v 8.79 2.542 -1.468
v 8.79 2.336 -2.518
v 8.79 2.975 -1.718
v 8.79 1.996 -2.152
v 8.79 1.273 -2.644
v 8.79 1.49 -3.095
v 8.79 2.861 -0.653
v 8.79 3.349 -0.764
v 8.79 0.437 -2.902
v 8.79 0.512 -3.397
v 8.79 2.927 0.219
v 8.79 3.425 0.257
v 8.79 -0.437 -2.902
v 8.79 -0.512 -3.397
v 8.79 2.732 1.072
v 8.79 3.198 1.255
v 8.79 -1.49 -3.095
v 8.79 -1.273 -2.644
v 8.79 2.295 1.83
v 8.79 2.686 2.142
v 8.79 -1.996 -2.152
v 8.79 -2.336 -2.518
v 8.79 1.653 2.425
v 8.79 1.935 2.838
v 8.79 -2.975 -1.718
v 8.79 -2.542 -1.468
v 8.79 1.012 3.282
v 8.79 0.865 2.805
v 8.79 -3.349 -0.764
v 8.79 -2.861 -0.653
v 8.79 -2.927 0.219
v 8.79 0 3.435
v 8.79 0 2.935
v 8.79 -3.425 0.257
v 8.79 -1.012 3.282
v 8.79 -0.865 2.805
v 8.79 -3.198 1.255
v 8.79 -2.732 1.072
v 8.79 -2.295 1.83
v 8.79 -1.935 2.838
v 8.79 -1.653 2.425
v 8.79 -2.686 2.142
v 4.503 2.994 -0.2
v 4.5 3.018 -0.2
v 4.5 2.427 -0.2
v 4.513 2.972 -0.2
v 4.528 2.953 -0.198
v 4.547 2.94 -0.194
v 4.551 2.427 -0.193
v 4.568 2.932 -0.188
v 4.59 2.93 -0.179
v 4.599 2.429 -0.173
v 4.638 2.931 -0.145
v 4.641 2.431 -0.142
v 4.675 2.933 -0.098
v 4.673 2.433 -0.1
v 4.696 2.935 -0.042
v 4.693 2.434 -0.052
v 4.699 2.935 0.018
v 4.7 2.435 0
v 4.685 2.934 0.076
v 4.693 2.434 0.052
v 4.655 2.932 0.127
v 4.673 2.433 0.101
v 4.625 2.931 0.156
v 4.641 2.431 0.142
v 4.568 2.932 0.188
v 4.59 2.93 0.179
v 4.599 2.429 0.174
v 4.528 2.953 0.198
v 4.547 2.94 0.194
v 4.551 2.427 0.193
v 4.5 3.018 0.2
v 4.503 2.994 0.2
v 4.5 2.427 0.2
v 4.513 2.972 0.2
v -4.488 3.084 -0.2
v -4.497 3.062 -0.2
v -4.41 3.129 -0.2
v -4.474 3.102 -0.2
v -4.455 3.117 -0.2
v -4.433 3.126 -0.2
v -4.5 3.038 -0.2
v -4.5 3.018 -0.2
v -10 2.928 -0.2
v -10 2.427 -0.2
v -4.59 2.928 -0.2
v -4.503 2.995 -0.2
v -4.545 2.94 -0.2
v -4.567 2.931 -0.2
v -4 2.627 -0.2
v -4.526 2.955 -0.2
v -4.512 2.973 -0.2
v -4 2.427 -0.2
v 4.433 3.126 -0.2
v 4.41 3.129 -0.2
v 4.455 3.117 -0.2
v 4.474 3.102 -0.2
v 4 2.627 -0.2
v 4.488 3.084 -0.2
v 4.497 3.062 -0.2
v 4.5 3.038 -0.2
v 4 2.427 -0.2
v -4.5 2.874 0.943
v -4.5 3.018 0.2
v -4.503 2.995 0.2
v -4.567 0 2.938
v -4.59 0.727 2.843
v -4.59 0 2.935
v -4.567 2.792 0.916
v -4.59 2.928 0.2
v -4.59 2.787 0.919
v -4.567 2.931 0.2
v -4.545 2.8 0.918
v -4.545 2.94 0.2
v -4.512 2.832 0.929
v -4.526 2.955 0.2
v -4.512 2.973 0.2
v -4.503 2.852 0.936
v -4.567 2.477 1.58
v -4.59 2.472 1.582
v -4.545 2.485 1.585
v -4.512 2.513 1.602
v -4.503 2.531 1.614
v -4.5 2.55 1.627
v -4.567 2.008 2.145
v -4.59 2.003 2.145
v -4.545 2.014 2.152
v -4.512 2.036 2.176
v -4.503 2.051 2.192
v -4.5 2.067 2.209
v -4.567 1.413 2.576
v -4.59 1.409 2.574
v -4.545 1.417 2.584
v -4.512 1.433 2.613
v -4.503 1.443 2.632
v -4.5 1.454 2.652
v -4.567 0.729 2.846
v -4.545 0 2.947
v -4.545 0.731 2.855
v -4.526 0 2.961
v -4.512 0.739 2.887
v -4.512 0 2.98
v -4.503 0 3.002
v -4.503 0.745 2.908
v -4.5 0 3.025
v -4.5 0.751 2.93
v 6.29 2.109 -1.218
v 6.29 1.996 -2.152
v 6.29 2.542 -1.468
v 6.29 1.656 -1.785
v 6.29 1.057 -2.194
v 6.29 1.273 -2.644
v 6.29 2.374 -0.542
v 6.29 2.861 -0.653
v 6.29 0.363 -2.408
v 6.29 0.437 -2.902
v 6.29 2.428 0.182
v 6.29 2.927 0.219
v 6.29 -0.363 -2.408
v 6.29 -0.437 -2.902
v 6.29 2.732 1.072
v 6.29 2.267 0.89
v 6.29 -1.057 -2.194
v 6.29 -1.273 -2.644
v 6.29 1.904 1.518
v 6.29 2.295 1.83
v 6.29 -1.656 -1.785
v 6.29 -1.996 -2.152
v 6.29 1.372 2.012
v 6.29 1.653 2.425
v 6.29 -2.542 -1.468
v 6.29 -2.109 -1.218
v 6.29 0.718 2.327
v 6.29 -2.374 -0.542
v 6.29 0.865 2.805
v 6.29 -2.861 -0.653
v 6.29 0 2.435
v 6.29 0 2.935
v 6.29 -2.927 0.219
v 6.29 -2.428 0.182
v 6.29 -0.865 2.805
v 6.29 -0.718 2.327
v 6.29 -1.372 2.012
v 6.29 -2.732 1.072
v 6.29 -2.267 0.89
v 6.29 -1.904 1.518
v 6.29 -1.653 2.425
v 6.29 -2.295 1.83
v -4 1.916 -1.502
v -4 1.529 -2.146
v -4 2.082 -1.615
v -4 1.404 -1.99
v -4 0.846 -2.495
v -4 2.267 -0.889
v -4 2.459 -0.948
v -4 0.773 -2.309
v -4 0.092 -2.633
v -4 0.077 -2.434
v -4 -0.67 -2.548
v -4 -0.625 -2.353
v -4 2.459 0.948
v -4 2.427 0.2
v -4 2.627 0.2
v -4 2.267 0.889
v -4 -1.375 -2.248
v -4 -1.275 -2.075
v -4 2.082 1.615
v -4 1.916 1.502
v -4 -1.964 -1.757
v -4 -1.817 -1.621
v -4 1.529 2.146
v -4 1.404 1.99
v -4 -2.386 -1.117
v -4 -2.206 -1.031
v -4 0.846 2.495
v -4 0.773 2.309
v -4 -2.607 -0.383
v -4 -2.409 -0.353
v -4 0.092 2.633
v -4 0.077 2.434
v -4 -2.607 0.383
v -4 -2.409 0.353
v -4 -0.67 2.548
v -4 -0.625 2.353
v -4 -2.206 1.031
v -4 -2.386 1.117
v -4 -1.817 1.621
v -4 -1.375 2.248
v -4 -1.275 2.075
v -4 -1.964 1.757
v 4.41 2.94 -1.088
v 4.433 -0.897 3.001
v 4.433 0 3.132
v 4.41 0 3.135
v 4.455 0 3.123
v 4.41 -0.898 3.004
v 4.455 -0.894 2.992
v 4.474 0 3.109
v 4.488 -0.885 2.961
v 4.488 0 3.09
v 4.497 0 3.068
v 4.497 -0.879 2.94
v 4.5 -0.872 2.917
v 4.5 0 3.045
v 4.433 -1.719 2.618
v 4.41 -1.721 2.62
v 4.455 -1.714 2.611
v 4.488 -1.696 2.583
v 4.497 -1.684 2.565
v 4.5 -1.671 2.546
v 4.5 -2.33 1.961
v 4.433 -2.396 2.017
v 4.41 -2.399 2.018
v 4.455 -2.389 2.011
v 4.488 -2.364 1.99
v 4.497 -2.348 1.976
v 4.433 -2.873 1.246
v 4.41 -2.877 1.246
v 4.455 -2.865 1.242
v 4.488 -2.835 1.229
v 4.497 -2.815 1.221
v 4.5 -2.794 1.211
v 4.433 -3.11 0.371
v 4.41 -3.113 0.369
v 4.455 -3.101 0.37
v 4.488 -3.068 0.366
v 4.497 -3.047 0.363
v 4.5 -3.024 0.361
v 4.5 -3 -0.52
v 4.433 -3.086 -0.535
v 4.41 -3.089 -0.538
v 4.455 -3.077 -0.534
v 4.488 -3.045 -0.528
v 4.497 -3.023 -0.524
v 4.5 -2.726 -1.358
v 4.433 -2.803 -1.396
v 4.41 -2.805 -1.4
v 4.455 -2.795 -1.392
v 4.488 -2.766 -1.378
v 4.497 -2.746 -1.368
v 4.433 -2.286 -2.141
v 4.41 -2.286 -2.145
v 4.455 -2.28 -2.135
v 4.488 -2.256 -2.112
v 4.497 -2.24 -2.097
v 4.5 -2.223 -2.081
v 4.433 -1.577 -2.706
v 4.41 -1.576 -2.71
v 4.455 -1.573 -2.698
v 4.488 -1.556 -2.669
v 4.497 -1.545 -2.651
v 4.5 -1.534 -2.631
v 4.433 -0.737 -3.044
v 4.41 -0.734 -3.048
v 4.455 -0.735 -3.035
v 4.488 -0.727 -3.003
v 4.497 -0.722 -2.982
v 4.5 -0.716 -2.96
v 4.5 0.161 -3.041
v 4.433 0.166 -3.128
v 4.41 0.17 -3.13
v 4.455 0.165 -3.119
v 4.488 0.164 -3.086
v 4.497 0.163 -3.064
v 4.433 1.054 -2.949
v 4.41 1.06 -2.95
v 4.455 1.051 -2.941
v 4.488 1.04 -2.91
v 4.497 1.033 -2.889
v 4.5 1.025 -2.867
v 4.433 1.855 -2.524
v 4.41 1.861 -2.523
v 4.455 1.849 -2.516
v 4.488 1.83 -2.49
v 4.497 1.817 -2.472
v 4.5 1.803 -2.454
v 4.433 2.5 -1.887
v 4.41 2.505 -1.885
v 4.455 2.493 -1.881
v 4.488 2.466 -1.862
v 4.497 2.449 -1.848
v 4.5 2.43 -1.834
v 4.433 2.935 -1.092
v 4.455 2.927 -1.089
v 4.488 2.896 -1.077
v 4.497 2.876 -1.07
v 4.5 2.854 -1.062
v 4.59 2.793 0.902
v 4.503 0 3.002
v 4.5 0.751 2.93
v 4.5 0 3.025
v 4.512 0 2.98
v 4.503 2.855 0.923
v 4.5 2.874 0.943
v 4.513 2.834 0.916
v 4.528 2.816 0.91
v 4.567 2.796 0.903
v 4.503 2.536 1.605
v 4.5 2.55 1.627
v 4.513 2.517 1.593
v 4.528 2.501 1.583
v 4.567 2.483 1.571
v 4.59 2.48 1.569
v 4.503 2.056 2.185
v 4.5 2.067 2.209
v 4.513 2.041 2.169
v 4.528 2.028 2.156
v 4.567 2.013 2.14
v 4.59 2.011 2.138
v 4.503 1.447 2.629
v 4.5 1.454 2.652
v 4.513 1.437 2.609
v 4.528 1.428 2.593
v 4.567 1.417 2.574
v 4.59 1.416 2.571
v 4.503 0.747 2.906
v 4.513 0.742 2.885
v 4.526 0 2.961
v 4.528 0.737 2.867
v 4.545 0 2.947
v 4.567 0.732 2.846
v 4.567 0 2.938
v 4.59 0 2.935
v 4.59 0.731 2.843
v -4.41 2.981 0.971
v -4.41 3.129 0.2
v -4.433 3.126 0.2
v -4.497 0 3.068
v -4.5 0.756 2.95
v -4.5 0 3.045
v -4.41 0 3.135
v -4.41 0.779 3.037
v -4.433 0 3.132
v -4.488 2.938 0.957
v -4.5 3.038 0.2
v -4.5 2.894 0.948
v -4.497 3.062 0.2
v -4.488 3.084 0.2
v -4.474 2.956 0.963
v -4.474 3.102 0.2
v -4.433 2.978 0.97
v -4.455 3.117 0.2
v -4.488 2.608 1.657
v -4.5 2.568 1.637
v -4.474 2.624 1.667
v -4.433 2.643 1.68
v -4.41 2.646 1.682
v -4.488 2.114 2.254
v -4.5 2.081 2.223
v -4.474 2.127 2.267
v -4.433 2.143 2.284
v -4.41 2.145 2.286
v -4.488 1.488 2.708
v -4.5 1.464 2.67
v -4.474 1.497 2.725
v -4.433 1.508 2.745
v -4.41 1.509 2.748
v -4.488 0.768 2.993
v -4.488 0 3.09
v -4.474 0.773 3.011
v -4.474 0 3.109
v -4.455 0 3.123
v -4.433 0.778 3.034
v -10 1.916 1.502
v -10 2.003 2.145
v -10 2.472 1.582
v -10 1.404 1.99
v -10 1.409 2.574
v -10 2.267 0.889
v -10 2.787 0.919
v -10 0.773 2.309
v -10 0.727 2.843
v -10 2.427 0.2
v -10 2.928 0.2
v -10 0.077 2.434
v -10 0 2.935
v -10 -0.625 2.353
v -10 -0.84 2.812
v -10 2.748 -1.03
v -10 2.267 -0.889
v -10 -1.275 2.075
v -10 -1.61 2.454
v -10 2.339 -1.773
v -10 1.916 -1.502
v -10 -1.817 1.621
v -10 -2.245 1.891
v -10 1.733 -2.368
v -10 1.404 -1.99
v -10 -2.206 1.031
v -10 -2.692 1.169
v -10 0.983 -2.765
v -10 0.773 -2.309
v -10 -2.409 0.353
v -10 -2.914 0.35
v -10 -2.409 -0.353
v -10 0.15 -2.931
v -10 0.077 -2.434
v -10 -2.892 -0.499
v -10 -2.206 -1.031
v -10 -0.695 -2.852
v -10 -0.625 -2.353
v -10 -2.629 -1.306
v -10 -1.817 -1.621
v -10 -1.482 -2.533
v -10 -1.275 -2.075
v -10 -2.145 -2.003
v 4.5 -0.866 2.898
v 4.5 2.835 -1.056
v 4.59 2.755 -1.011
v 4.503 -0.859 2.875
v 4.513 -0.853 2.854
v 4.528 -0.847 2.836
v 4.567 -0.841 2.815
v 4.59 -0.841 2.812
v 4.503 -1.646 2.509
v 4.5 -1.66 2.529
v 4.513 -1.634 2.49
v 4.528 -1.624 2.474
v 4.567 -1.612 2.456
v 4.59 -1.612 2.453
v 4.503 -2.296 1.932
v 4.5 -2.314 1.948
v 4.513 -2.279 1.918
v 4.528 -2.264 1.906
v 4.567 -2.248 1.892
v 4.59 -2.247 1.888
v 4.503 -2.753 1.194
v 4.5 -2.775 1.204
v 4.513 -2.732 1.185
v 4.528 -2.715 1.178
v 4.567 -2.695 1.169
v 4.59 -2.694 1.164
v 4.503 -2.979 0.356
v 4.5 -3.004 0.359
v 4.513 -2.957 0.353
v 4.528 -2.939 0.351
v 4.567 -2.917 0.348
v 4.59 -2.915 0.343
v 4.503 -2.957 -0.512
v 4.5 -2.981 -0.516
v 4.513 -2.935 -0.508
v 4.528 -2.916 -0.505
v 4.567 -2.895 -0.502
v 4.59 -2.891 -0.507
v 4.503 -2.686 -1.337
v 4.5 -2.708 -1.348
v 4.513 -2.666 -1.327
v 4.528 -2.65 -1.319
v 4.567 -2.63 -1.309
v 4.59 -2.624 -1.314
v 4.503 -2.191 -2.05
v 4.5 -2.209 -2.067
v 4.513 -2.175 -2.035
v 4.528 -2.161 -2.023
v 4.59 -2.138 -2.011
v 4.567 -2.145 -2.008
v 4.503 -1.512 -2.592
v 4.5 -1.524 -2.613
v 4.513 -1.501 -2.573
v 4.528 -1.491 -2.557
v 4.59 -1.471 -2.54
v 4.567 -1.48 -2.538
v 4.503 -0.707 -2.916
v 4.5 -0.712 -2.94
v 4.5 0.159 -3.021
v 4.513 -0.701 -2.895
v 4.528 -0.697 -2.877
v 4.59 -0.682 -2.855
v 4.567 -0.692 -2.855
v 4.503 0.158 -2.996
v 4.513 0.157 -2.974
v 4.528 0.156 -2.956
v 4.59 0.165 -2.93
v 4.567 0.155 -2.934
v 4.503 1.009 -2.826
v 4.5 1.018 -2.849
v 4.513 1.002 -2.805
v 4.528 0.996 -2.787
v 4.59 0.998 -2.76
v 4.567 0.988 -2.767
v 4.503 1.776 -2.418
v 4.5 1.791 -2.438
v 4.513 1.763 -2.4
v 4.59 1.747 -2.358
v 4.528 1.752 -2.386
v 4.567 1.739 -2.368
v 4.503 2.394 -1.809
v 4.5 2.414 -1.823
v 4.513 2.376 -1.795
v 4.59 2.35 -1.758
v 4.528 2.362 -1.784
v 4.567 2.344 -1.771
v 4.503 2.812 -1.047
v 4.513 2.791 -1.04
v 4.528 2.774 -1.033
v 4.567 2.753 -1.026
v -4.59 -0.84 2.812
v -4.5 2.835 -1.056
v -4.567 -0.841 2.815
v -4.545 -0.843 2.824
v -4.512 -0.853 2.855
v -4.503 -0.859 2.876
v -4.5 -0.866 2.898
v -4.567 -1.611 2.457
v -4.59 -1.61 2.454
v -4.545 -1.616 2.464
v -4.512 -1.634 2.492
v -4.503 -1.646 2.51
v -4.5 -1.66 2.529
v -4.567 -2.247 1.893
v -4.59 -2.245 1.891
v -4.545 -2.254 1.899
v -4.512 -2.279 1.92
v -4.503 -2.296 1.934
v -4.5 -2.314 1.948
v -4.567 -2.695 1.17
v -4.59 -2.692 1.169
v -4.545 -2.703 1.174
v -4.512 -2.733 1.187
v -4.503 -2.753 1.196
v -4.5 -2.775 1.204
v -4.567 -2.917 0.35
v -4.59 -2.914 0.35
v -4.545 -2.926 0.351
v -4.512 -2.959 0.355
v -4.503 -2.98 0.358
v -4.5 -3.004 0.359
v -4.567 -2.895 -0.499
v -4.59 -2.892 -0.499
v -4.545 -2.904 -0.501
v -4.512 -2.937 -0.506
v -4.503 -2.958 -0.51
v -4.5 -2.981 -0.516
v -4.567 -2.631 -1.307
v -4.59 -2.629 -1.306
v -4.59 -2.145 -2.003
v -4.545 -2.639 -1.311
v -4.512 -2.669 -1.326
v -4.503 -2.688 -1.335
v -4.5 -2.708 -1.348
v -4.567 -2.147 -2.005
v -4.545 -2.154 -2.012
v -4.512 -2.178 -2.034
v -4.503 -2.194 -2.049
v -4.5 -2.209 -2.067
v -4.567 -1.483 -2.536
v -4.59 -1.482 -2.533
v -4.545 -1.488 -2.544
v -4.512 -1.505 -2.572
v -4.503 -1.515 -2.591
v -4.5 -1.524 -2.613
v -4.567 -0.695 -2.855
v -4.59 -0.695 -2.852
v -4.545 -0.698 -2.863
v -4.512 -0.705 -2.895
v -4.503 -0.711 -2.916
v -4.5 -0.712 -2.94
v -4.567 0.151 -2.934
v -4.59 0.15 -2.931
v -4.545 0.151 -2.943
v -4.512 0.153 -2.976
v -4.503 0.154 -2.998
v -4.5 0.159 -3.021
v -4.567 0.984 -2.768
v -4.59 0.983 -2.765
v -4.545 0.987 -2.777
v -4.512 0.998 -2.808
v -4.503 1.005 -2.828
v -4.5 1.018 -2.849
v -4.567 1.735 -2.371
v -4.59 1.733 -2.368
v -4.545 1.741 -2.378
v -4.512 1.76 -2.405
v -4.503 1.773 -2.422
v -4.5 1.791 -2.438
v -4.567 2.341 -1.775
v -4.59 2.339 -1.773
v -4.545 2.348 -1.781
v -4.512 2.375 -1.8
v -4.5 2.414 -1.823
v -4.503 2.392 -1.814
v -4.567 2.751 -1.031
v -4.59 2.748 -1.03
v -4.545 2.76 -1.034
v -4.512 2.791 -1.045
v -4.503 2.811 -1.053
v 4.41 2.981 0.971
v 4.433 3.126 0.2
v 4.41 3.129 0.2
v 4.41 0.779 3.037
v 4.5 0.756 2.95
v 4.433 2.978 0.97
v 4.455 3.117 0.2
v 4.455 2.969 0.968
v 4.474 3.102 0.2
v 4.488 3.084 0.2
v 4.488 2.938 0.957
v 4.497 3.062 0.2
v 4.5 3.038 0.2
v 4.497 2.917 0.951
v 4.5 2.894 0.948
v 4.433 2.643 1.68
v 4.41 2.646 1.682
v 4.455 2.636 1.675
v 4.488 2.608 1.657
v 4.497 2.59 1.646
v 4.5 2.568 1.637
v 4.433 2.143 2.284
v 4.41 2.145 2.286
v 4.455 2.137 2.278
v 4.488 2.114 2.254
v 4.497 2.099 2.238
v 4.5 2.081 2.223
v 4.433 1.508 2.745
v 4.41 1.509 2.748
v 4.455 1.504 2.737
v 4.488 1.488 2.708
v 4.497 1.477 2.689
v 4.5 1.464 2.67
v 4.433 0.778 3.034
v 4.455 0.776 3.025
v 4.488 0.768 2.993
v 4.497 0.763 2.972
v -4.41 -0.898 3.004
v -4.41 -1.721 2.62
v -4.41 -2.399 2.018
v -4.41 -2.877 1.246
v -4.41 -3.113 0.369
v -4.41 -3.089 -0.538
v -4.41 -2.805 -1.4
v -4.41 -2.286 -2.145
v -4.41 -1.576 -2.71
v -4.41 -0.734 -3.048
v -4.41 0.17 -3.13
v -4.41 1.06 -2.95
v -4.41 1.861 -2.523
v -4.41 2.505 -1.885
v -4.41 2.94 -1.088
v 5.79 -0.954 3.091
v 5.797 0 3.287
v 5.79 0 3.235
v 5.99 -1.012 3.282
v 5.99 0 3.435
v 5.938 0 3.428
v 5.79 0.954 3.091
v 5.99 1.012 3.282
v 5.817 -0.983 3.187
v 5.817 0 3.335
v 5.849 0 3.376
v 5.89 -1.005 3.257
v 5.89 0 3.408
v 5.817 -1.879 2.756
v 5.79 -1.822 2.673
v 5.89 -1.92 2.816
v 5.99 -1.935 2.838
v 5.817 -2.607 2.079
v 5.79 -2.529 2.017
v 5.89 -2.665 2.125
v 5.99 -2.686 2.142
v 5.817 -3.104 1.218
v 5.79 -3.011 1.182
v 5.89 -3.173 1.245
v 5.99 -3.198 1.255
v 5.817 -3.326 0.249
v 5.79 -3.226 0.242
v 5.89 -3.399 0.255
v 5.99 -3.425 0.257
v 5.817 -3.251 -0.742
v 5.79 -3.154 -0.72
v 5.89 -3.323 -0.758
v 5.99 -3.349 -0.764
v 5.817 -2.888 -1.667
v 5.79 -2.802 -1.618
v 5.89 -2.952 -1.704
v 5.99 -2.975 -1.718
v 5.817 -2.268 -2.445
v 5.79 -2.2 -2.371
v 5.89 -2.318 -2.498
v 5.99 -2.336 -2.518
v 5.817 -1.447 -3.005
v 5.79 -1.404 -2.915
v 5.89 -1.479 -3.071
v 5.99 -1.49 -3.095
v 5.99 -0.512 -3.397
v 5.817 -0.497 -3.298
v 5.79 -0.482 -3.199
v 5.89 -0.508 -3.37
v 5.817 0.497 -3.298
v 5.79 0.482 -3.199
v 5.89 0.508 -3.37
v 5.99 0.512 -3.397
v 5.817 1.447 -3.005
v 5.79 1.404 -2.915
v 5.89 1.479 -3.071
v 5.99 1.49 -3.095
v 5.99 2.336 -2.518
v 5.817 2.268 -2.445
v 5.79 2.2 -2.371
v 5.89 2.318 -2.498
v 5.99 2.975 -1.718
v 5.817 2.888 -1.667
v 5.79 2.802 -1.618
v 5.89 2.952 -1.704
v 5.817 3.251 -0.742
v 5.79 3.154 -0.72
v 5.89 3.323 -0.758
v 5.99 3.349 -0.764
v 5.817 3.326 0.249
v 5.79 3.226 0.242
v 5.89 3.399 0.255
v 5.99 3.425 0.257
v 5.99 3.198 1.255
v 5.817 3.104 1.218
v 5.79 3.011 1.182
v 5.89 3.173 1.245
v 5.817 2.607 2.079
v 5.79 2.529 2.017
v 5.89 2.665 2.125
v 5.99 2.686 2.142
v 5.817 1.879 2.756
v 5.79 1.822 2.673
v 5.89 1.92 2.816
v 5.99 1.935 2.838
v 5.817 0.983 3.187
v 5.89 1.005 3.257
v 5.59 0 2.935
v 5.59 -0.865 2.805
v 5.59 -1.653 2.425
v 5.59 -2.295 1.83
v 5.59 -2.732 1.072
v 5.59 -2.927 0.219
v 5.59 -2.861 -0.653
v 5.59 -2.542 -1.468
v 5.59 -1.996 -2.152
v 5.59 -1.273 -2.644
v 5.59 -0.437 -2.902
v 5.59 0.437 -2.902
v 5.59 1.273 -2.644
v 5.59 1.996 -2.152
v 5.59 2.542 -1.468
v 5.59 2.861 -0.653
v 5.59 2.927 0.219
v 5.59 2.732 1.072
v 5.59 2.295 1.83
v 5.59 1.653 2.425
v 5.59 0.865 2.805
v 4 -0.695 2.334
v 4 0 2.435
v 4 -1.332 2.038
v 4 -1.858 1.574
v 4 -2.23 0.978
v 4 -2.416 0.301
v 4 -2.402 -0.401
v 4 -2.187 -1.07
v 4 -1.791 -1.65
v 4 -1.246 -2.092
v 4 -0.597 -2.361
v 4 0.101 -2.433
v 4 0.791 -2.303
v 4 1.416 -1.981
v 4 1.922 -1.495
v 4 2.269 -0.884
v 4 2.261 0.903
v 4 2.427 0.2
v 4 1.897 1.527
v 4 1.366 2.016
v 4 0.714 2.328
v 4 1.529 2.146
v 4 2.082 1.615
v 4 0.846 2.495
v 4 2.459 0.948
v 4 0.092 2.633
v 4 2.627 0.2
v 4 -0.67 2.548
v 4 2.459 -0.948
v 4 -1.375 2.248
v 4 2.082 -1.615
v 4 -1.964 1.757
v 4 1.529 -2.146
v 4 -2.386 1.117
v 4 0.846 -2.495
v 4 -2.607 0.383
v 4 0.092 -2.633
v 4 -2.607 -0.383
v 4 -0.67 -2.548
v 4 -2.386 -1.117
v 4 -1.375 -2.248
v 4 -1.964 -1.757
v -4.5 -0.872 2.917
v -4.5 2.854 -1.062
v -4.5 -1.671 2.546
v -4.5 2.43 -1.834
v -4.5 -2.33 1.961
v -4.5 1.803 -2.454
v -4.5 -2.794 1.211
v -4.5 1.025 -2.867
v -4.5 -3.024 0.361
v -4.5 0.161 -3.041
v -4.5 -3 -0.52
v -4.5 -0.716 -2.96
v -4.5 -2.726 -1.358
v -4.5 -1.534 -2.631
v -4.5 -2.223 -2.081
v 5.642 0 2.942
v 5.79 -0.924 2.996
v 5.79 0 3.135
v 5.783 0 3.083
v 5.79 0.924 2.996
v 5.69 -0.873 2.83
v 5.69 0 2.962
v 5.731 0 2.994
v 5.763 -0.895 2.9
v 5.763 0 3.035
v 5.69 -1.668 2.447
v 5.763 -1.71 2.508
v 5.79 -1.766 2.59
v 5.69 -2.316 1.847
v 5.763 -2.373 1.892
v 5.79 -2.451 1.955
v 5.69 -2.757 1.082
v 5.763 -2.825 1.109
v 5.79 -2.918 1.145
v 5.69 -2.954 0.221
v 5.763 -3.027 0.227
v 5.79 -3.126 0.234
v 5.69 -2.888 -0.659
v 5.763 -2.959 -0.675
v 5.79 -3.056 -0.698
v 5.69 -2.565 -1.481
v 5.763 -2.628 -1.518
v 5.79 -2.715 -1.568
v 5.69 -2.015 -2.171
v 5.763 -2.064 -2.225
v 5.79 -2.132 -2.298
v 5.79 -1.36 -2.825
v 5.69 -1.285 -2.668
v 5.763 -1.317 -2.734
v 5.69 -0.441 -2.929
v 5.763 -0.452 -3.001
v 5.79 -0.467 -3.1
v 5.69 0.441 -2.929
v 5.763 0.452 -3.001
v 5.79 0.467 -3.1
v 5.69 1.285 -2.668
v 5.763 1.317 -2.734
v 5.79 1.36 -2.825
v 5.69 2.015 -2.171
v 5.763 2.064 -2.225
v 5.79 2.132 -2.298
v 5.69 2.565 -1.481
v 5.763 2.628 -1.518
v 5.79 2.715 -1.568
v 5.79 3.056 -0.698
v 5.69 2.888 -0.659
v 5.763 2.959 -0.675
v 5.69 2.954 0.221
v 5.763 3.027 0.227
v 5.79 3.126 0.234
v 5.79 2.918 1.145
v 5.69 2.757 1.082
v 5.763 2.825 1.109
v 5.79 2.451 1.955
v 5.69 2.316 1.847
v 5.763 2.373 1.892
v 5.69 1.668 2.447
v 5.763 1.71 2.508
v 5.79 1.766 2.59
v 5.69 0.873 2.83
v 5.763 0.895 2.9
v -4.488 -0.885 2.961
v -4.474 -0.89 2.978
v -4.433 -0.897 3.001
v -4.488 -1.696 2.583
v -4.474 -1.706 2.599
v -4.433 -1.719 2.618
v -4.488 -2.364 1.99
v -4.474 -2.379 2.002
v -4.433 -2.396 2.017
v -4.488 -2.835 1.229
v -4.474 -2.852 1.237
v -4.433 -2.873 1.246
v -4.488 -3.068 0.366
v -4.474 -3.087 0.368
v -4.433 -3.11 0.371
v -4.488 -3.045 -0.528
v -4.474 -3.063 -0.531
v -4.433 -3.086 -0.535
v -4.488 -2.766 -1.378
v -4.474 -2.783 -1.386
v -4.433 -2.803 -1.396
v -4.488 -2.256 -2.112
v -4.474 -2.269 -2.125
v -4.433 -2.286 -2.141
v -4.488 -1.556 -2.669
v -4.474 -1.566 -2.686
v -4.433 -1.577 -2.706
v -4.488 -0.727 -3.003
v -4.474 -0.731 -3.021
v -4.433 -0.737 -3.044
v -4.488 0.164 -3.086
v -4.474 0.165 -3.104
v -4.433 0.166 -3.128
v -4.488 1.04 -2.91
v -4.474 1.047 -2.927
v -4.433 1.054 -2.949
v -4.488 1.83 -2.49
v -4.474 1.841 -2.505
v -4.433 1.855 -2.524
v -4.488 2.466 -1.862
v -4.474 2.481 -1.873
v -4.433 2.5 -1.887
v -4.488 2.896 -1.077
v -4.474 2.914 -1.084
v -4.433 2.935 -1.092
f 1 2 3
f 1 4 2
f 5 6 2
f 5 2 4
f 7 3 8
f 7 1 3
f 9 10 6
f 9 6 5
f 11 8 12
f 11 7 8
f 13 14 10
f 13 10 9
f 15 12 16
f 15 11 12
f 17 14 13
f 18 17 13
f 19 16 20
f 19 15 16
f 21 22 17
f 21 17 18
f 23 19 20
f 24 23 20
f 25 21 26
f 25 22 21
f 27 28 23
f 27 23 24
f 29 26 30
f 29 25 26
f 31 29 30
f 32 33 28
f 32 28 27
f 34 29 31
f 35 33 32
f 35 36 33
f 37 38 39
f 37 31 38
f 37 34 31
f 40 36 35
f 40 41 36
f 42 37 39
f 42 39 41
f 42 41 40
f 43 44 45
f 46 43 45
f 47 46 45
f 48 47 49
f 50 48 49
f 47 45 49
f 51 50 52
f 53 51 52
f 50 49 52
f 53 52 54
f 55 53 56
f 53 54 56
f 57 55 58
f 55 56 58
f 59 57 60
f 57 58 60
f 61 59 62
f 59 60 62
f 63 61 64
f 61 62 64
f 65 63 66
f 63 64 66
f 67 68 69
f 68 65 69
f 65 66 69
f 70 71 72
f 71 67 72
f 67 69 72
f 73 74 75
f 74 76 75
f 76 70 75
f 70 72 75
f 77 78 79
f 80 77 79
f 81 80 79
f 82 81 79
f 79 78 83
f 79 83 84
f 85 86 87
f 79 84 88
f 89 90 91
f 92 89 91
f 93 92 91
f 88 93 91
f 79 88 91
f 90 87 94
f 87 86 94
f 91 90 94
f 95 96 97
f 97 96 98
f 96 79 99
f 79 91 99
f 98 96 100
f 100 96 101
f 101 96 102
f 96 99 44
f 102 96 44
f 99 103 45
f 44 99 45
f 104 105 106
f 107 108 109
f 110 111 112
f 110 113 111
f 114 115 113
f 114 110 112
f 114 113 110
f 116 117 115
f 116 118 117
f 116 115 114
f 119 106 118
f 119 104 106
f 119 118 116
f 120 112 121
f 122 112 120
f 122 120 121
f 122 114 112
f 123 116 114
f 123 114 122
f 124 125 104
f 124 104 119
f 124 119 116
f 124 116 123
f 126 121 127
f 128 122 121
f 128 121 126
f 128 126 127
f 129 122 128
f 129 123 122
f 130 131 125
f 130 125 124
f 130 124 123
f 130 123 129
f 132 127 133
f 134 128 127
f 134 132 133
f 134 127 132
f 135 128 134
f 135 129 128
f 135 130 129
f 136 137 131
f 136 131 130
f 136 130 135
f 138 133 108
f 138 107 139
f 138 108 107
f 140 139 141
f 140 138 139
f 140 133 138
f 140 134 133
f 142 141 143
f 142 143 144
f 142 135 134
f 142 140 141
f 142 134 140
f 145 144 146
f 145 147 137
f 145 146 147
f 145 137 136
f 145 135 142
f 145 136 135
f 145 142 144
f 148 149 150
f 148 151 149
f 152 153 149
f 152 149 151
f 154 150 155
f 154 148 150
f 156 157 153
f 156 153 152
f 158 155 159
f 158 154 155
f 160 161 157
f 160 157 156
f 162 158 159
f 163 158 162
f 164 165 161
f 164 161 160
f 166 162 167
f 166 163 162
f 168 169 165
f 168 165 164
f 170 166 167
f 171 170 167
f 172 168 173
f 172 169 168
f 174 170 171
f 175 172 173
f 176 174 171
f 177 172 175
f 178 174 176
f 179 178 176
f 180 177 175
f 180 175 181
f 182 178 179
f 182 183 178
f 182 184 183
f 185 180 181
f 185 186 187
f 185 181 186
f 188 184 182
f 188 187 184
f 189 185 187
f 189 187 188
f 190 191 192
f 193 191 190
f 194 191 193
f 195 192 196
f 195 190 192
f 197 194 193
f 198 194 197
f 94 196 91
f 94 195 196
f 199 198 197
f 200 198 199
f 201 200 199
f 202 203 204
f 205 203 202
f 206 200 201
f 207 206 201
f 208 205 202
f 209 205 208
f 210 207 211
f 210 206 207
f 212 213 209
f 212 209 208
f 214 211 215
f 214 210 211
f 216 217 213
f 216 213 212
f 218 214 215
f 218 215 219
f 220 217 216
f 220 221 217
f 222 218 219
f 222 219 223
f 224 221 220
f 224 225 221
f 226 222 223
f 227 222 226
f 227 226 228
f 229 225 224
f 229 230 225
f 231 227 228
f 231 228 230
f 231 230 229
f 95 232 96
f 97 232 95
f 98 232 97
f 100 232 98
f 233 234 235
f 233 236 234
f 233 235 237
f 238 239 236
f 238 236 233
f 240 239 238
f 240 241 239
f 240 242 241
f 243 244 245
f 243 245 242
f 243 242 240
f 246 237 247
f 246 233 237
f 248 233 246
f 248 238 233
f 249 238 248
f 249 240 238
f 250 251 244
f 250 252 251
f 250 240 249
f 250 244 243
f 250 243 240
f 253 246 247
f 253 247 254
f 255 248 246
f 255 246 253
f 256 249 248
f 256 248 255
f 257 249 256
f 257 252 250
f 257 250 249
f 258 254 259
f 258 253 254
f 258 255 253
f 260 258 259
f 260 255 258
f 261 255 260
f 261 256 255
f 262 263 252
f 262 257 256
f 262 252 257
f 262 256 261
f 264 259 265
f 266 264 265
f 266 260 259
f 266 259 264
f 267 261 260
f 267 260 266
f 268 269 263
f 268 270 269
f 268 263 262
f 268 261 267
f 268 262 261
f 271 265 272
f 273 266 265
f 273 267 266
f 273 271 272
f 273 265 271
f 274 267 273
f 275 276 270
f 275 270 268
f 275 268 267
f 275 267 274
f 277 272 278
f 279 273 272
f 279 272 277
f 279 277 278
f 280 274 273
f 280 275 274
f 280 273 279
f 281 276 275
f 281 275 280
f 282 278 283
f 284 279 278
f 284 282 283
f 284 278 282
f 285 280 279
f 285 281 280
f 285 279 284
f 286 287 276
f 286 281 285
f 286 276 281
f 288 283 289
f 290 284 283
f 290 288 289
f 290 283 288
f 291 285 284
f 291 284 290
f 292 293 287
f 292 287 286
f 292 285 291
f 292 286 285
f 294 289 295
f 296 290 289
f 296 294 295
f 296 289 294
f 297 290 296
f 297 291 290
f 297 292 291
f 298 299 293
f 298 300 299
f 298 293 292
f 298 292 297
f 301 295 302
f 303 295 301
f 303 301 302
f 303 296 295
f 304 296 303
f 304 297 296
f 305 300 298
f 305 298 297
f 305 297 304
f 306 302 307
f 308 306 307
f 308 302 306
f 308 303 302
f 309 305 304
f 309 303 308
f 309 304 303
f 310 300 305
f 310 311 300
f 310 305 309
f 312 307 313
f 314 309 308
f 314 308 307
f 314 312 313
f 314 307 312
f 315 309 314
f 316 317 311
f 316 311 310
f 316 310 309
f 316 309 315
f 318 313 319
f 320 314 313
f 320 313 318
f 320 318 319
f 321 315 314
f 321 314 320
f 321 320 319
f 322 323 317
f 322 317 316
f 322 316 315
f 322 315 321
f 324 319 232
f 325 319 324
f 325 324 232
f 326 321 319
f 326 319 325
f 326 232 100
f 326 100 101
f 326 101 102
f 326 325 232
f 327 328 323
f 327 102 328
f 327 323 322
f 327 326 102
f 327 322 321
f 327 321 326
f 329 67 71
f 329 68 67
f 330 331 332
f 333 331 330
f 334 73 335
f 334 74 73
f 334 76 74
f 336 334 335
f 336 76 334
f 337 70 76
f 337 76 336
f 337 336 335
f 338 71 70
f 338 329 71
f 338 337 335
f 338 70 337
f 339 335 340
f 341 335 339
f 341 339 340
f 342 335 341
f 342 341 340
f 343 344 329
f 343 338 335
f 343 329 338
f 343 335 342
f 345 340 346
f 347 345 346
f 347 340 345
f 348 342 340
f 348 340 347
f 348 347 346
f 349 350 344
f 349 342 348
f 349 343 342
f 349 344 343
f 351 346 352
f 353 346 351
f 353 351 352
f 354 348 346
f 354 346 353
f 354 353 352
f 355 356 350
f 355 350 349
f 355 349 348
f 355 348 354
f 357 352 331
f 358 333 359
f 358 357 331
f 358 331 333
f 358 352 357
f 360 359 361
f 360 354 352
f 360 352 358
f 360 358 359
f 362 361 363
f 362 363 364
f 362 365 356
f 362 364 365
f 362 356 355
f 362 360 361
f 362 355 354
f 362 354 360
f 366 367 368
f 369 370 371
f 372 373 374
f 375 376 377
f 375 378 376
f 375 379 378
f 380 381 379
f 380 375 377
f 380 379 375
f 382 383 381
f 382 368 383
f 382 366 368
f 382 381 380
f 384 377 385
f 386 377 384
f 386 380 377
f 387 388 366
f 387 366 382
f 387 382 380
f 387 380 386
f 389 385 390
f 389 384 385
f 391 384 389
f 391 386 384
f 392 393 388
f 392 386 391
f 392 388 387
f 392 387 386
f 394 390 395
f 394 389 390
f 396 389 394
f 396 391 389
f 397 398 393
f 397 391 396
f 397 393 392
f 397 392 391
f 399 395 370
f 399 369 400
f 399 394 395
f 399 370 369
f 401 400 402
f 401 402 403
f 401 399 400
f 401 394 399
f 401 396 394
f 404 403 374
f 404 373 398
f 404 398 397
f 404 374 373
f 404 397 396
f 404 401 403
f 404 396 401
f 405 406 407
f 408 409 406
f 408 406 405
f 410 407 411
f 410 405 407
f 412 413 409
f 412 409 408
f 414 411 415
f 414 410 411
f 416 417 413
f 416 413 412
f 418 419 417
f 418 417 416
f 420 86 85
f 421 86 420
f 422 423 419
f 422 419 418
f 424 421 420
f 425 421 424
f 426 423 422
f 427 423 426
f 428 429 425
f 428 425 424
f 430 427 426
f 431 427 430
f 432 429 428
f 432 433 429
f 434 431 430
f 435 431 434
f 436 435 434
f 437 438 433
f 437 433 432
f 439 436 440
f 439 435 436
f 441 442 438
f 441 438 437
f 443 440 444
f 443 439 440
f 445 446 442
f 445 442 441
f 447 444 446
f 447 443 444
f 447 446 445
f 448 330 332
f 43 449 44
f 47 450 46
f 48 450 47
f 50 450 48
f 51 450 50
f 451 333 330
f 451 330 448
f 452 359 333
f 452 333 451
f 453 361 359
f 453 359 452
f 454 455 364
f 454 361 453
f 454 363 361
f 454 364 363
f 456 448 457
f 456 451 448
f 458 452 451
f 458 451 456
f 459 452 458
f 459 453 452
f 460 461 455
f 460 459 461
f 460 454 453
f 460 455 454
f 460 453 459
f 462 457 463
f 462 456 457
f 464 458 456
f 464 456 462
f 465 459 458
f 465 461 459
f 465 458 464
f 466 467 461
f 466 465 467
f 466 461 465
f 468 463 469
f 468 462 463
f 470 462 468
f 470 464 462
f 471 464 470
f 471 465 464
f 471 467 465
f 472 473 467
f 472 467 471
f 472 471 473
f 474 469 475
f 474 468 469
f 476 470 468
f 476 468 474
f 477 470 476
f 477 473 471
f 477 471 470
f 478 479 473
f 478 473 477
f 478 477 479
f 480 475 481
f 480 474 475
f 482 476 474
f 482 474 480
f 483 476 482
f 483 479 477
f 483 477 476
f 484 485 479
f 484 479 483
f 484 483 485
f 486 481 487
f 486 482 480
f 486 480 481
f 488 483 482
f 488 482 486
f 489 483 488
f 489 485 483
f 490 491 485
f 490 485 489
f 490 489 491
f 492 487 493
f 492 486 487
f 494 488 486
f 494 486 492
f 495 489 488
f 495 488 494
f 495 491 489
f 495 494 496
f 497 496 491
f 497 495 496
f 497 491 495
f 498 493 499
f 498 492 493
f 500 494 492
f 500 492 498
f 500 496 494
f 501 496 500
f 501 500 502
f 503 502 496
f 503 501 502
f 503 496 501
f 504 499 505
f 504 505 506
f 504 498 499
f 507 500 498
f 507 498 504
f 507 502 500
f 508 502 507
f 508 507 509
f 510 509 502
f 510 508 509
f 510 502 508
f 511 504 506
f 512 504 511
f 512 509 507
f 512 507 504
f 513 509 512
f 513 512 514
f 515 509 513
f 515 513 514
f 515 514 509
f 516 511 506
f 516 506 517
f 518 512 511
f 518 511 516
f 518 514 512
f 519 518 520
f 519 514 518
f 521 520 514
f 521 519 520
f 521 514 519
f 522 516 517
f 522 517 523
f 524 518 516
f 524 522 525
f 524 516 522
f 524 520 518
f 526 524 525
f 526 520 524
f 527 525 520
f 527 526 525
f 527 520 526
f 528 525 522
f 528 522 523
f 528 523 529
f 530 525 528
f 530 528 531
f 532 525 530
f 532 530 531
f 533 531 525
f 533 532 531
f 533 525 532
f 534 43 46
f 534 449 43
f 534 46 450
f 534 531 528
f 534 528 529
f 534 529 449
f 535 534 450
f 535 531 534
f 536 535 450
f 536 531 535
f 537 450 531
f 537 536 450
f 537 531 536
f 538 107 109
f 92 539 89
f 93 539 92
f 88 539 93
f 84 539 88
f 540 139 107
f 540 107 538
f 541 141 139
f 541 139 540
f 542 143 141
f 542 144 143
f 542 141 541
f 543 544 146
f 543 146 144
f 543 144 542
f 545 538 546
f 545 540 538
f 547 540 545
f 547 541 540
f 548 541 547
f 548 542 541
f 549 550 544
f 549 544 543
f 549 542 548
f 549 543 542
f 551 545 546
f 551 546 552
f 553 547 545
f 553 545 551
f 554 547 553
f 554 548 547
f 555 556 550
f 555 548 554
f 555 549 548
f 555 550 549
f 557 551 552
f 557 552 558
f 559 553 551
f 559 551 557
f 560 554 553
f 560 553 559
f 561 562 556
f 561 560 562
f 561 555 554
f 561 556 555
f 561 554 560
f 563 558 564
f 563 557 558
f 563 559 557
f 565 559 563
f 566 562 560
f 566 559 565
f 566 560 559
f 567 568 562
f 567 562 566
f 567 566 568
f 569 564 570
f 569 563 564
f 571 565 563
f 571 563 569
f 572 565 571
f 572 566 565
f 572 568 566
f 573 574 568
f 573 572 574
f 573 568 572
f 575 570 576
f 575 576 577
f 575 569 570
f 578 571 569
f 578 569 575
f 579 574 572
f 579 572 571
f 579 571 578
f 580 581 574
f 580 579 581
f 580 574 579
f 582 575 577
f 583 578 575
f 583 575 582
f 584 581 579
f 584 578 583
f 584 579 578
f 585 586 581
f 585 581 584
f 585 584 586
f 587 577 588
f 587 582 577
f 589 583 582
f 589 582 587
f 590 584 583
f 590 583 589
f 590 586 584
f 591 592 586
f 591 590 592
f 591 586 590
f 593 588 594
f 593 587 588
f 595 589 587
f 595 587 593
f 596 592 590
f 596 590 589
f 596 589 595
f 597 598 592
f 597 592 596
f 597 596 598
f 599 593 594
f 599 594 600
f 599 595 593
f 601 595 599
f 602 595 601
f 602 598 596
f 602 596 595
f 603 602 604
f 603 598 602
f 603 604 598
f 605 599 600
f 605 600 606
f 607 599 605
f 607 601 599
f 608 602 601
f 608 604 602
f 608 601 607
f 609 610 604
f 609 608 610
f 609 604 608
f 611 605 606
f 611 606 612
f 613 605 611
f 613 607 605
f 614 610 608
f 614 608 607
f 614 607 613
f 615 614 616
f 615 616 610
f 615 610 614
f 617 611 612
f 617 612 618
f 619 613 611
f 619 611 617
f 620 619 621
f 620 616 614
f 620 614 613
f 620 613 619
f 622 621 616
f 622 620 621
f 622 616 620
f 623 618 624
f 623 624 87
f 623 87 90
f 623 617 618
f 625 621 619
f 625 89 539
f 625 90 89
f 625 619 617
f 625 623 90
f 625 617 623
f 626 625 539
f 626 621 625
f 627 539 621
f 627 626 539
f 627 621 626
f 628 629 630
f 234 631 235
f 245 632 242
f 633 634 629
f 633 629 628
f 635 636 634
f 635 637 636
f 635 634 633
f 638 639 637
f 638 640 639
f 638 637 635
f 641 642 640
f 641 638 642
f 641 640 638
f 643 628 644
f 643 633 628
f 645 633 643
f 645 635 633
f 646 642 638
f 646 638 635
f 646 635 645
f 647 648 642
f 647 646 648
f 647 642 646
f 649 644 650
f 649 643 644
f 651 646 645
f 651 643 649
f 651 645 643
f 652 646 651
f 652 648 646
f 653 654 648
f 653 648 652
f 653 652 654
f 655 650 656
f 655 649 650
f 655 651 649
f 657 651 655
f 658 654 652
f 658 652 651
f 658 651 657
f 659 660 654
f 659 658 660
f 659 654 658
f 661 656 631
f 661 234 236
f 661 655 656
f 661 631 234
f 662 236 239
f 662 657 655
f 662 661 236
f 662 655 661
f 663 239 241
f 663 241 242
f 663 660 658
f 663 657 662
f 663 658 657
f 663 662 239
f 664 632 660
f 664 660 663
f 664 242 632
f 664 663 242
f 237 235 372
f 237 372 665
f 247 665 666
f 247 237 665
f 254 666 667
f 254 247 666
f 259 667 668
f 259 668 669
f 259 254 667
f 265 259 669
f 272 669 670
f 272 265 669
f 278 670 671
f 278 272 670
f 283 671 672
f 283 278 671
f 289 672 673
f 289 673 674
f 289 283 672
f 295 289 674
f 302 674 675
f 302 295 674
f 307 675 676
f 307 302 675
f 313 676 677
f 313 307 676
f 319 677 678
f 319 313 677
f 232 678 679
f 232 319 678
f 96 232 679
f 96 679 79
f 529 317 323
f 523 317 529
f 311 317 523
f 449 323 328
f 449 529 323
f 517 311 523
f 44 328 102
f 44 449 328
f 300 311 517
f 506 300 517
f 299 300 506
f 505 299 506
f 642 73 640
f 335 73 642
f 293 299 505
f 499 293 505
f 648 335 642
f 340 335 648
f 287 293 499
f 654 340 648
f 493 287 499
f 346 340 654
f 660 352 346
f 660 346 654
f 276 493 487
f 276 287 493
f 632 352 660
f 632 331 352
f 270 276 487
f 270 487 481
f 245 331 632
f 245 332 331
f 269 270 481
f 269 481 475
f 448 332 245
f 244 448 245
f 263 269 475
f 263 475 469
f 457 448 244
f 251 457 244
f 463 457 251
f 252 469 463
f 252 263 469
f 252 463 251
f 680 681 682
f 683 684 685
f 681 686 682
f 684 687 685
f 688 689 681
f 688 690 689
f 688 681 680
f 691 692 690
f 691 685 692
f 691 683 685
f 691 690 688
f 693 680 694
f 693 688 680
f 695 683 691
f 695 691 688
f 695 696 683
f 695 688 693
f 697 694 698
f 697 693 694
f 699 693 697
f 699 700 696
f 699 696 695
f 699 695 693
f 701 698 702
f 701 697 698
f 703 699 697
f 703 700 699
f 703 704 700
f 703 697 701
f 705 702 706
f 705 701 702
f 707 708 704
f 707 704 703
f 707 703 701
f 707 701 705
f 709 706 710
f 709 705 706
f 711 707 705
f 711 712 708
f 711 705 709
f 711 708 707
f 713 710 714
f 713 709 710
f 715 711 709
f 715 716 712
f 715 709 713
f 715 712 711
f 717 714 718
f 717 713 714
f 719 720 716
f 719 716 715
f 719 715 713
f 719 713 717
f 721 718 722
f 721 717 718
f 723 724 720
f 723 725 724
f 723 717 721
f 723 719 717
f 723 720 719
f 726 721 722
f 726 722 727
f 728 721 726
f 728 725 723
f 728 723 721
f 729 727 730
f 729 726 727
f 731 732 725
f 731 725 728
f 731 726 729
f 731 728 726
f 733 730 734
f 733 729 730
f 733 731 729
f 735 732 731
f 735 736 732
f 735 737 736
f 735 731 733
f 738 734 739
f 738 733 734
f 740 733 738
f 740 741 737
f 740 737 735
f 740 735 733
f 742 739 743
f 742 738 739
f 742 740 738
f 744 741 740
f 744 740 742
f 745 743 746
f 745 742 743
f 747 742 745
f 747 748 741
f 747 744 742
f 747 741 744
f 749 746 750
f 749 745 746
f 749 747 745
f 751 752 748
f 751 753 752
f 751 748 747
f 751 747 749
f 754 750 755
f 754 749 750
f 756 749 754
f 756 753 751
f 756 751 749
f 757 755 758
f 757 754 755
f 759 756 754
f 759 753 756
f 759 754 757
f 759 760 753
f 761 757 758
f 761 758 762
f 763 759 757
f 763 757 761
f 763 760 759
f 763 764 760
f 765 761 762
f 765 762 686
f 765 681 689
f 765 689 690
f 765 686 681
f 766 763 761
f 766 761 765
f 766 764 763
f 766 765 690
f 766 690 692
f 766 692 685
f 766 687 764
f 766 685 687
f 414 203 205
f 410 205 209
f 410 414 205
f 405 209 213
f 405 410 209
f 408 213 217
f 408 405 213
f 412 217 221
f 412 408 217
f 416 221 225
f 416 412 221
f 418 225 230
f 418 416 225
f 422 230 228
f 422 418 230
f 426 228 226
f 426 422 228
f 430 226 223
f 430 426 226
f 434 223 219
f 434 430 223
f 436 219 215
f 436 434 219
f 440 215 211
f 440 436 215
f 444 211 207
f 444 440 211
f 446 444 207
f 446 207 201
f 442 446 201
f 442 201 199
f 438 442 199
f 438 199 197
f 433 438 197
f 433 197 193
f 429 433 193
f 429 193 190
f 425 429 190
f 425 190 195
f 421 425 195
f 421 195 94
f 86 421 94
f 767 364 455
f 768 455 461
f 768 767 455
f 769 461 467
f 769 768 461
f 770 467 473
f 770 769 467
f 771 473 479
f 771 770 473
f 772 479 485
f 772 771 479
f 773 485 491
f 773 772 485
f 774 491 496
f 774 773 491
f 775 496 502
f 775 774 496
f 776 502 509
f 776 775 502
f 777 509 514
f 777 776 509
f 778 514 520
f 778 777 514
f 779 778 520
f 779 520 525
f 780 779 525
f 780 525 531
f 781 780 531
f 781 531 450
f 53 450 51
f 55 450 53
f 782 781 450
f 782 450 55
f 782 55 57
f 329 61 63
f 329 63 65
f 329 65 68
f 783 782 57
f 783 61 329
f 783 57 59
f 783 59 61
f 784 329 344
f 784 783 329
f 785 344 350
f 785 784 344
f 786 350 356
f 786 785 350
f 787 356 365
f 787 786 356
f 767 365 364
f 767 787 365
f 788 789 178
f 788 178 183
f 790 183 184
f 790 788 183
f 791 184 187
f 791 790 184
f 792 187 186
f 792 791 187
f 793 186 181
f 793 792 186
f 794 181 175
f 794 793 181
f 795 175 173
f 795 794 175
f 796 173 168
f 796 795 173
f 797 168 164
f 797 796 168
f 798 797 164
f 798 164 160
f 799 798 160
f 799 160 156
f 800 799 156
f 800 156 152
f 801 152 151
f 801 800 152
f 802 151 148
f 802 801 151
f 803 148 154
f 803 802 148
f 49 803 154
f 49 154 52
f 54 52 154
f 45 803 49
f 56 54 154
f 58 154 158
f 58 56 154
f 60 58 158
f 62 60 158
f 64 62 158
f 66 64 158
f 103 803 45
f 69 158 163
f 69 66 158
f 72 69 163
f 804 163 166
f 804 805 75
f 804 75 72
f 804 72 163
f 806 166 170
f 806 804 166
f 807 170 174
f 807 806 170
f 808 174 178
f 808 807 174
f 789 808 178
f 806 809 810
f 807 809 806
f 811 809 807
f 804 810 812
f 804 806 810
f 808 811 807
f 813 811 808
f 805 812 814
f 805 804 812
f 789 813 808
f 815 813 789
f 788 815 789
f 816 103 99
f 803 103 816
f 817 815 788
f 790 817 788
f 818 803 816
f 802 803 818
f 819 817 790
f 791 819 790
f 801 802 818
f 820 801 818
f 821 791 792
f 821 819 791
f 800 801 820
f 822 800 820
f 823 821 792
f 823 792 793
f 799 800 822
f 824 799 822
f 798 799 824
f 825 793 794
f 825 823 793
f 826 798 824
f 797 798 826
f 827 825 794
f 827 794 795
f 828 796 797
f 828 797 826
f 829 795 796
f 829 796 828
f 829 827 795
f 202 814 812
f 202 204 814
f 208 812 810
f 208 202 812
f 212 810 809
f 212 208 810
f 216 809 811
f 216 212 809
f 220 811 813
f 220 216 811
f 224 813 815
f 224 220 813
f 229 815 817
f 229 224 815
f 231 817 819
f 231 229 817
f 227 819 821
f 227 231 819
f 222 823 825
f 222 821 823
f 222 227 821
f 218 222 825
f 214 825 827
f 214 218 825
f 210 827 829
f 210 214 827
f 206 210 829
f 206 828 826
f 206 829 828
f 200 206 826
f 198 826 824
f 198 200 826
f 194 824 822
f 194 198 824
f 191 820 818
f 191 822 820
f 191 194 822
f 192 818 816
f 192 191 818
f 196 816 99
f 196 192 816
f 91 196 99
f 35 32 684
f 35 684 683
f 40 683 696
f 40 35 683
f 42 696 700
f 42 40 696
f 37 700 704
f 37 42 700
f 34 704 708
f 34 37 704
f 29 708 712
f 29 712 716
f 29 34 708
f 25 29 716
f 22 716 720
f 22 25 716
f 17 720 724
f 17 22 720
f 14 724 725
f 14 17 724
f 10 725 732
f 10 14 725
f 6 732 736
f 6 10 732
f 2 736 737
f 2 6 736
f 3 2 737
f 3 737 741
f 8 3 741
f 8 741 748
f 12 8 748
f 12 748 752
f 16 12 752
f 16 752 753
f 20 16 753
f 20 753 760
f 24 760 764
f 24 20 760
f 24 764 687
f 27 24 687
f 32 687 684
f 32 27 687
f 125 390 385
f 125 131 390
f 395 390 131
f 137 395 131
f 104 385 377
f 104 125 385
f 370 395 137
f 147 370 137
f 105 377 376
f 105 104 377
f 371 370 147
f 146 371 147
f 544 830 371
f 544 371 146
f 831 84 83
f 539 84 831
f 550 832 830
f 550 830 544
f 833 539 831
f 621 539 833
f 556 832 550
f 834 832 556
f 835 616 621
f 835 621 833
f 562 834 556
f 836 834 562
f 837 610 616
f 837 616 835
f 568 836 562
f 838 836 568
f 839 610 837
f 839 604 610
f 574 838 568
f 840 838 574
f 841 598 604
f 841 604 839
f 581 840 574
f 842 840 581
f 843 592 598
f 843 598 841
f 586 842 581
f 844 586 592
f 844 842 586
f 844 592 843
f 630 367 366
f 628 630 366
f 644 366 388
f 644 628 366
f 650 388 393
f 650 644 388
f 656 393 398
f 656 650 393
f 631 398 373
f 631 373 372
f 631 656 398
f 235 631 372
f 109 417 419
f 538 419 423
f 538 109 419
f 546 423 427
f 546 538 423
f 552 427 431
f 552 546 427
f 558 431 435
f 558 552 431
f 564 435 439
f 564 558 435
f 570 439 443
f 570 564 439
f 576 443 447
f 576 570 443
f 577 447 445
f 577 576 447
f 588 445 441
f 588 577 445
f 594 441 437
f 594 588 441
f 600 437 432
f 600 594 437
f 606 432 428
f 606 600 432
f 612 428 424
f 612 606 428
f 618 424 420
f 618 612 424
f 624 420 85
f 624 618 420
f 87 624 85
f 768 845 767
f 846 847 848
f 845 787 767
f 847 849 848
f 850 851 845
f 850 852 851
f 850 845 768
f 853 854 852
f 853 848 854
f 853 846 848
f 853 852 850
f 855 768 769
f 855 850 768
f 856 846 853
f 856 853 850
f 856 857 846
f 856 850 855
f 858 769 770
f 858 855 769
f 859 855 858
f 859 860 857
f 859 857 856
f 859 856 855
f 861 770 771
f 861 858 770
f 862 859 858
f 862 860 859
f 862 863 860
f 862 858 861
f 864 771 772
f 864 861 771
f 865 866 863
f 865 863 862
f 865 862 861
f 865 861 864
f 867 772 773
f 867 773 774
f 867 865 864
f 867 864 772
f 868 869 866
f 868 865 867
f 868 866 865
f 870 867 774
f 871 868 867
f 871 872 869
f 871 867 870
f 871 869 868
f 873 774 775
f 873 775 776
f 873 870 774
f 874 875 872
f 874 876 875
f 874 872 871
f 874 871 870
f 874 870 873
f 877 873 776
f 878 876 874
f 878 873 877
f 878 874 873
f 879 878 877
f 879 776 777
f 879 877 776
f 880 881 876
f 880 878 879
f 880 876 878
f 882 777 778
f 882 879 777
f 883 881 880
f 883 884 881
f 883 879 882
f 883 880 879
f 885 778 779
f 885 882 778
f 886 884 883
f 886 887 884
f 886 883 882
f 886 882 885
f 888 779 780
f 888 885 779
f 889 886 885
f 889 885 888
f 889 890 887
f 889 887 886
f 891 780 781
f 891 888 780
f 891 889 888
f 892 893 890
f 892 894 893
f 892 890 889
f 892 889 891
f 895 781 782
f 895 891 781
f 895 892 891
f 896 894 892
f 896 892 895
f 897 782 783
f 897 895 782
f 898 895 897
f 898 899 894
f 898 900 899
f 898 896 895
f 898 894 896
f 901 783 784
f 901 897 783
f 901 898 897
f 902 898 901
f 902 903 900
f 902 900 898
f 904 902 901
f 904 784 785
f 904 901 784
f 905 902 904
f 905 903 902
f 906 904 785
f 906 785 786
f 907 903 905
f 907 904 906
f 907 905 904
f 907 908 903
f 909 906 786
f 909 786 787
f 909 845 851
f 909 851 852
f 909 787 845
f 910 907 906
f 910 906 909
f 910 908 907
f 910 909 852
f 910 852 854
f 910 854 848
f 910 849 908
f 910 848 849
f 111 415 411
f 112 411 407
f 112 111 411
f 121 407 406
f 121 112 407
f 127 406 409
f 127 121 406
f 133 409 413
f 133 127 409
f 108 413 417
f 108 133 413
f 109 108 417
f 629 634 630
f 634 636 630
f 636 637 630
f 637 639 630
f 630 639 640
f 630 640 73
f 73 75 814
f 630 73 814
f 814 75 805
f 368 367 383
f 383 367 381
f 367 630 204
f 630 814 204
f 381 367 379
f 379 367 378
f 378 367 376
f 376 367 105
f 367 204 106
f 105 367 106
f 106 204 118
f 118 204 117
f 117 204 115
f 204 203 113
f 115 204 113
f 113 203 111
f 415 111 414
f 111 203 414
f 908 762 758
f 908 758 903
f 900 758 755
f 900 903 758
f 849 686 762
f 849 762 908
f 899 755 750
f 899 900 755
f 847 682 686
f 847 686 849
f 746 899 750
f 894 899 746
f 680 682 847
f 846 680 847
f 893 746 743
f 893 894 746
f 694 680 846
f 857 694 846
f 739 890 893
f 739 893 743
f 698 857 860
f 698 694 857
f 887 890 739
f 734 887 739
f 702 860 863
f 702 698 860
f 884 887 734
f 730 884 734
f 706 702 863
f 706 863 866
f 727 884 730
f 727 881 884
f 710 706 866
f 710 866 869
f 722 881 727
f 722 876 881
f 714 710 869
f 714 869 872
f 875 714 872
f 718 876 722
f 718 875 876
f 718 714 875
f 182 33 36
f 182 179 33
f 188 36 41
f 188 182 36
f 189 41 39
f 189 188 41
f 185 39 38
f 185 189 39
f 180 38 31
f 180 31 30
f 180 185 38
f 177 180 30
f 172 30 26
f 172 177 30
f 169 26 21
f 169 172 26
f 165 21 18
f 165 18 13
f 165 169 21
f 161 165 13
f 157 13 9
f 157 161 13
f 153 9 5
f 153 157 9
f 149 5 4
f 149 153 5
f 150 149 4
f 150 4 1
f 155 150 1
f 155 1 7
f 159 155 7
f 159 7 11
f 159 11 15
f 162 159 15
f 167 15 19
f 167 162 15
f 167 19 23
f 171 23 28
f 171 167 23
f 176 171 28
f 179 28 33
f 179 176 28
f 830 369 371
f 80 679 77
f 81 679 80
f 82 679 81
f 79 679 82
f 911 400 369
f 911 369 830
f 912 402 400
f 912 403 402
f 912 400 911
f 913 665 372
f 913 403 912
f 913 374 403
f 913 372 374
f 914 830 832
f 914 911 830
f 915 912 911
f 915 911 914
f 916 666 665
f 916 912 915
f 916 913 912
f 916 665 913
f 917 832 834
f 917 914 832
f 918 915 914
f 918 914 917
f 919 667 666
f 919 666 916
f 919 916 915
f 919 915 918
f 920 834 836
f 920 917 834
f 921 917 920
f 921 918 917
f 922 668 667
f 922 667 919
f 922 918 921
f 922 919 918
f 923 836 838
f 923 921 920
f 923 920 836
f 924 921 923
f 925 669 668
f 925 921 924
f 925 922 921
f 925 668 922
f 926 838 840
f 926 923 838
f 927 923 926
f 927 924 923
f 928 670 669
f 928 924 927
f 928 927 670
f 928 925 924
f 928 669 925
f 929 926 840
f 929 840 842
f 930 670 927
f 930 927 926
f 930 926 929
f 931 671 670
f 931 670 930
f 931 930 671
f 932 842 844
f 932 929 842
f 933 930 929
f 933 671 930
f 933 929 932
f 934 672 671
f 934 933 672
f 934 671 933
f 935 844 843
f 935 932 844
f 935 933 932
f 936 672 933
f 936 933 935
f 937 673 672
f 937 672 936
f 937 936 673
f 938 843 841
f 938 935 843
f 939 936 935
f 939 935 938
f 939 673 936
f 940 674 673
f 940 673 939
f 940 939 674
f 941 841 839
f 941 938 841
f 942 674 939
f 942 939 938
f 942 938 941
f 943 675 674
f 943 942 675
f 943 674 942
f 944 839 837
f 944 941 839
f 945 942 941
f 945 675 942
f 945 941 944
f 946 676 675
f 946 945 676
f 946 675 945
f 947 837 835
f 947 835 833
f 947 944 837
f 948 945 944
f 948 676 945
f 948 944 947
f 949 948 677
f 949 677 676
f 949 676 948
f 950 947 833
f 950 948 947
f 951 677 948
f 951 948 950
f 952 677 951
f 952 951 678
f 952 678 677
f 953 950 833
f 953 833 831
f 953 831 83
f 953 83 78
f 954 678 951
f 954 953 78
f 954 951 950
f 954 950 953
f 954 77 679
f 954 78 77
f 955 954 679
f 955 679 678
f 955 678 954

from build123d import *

# Parameters (mm, degrees)
CUT_EXTRUDE3_START = 2.426772
CUT_EXTRUDE3_DEPTH = 0.708228
SKETCH6_R          = 3.435
SKETCH6_R_2        = 2.935
CUT_EXTRUDE4_DEPTH = 2


with BuildPart() as part:
    # Sketch4 → Revolve2 (revolve)
    with BuildSketch(Plane.XY, mode=Mode.PRIVATE) as revolve2_sk:
        with BuildLine():
            Line((10.79, 2.935), (6.29, 2.935))
            Line((6.29, 2.935), (6.29, 2.435))
            Line((6.29, 2.435), (4, 2.435))
            Line((4, 2.435), (4, 2.635))
            Line((4, 2.635), (-4, 2.635))
            Line((-4, 2.635), (-4, 2.435))
            Line((-4, 2.435), (-10, 2.435))
            Line((-10, 2.435), (-10, 2.935))
            Line((-10, 2.935), (-4.59, 2.935))
            ThreePointArc((-4.59, 2.935), (-4.52636039, 2.96136039), (-4.5, 3.025))
            Line((-4.5, 3.025), (-4.5, 3.045))
            ThreePointArc((-4.5, 3.045), (-4.47363961, 3.10863961), (-4.41, 3.135))
            Line((-4.41, 3.135), (4.41, 3.135))
            ThreePointArc((4.41, 3.135), (4.47363961, 3.10863961), (4.5, 3.045))
            Line((4.5, 3.045), (4.5, 3.025))
            ThreePointArc((4.5, 3.025), (4.52636039, 2.96136039), (4.59, 2.935))
            Line((4.59, 2.935), (5.59, 2.935))
            ThreePointArc((5.59, 2.935), (5.731421356, 2.993578644), (5.79, 3.135))
            Line((5.79, 3.135), (5.79, 3.235))
            ThreePointArc((5.79, 3.235), (5.848578644, 3.376421356), (5.99, 3.435))
            Line((5.99, 3.435), (10.79, 3.435))
            Line((10.79, 3.435), (10.79, 2.935))
        make_face()
    revolve(revolve2_sk.sketch.rotate(Axis((-16.2, 0, 0), (1, 0, 0)), 90), axis=Axis((-16.2, 0, 0), (1, 0, 0)))

    # Sketch5 → Cut-Extrude3 (cut)
    with BuildSketch(Plane(origin=(0, 0, 0), x_dir=(1, 0, 0), z_dir=(0, 1, 0)).offset(CUT_EXTRUDE3_START)):
        with BuildLine():
            Line((-10, 0.2), (4.5, 0.2))
            ThreePointArc((4.5, 0.2), (4.7, 0), (4.5, -0.2))
            Line((4.5, -0.2), (-10, -0.2))
            Line((-10, -0.2), (-10, 0.2))
        make_face()
    extrude(amount=CUT_EXTRUDE3_DEPTH, mode=Mode.SUBTRACT)

    # Sketch6 → Cut-Extrude4 (cut)
    with BuildSketch(Plane(origin=(10.79, 0, 0), x_dir=(0, 0, -1), z_dir=(1, 0, 0))):
        with Locations(Location((0, 0, 0), (0, 0, 180))):
            Circle(SKETCH6_R)
        with Locations(Location((0, 0, 0), (0, 0, 180))):
            Circle(SKETCH6_R_2, mode=Mode.SUBTRACT)
    extrude(amount=-CUT_EXTRUDE4_DEPTH, mode=Mode.SUBTRACT)


solid = part.part
